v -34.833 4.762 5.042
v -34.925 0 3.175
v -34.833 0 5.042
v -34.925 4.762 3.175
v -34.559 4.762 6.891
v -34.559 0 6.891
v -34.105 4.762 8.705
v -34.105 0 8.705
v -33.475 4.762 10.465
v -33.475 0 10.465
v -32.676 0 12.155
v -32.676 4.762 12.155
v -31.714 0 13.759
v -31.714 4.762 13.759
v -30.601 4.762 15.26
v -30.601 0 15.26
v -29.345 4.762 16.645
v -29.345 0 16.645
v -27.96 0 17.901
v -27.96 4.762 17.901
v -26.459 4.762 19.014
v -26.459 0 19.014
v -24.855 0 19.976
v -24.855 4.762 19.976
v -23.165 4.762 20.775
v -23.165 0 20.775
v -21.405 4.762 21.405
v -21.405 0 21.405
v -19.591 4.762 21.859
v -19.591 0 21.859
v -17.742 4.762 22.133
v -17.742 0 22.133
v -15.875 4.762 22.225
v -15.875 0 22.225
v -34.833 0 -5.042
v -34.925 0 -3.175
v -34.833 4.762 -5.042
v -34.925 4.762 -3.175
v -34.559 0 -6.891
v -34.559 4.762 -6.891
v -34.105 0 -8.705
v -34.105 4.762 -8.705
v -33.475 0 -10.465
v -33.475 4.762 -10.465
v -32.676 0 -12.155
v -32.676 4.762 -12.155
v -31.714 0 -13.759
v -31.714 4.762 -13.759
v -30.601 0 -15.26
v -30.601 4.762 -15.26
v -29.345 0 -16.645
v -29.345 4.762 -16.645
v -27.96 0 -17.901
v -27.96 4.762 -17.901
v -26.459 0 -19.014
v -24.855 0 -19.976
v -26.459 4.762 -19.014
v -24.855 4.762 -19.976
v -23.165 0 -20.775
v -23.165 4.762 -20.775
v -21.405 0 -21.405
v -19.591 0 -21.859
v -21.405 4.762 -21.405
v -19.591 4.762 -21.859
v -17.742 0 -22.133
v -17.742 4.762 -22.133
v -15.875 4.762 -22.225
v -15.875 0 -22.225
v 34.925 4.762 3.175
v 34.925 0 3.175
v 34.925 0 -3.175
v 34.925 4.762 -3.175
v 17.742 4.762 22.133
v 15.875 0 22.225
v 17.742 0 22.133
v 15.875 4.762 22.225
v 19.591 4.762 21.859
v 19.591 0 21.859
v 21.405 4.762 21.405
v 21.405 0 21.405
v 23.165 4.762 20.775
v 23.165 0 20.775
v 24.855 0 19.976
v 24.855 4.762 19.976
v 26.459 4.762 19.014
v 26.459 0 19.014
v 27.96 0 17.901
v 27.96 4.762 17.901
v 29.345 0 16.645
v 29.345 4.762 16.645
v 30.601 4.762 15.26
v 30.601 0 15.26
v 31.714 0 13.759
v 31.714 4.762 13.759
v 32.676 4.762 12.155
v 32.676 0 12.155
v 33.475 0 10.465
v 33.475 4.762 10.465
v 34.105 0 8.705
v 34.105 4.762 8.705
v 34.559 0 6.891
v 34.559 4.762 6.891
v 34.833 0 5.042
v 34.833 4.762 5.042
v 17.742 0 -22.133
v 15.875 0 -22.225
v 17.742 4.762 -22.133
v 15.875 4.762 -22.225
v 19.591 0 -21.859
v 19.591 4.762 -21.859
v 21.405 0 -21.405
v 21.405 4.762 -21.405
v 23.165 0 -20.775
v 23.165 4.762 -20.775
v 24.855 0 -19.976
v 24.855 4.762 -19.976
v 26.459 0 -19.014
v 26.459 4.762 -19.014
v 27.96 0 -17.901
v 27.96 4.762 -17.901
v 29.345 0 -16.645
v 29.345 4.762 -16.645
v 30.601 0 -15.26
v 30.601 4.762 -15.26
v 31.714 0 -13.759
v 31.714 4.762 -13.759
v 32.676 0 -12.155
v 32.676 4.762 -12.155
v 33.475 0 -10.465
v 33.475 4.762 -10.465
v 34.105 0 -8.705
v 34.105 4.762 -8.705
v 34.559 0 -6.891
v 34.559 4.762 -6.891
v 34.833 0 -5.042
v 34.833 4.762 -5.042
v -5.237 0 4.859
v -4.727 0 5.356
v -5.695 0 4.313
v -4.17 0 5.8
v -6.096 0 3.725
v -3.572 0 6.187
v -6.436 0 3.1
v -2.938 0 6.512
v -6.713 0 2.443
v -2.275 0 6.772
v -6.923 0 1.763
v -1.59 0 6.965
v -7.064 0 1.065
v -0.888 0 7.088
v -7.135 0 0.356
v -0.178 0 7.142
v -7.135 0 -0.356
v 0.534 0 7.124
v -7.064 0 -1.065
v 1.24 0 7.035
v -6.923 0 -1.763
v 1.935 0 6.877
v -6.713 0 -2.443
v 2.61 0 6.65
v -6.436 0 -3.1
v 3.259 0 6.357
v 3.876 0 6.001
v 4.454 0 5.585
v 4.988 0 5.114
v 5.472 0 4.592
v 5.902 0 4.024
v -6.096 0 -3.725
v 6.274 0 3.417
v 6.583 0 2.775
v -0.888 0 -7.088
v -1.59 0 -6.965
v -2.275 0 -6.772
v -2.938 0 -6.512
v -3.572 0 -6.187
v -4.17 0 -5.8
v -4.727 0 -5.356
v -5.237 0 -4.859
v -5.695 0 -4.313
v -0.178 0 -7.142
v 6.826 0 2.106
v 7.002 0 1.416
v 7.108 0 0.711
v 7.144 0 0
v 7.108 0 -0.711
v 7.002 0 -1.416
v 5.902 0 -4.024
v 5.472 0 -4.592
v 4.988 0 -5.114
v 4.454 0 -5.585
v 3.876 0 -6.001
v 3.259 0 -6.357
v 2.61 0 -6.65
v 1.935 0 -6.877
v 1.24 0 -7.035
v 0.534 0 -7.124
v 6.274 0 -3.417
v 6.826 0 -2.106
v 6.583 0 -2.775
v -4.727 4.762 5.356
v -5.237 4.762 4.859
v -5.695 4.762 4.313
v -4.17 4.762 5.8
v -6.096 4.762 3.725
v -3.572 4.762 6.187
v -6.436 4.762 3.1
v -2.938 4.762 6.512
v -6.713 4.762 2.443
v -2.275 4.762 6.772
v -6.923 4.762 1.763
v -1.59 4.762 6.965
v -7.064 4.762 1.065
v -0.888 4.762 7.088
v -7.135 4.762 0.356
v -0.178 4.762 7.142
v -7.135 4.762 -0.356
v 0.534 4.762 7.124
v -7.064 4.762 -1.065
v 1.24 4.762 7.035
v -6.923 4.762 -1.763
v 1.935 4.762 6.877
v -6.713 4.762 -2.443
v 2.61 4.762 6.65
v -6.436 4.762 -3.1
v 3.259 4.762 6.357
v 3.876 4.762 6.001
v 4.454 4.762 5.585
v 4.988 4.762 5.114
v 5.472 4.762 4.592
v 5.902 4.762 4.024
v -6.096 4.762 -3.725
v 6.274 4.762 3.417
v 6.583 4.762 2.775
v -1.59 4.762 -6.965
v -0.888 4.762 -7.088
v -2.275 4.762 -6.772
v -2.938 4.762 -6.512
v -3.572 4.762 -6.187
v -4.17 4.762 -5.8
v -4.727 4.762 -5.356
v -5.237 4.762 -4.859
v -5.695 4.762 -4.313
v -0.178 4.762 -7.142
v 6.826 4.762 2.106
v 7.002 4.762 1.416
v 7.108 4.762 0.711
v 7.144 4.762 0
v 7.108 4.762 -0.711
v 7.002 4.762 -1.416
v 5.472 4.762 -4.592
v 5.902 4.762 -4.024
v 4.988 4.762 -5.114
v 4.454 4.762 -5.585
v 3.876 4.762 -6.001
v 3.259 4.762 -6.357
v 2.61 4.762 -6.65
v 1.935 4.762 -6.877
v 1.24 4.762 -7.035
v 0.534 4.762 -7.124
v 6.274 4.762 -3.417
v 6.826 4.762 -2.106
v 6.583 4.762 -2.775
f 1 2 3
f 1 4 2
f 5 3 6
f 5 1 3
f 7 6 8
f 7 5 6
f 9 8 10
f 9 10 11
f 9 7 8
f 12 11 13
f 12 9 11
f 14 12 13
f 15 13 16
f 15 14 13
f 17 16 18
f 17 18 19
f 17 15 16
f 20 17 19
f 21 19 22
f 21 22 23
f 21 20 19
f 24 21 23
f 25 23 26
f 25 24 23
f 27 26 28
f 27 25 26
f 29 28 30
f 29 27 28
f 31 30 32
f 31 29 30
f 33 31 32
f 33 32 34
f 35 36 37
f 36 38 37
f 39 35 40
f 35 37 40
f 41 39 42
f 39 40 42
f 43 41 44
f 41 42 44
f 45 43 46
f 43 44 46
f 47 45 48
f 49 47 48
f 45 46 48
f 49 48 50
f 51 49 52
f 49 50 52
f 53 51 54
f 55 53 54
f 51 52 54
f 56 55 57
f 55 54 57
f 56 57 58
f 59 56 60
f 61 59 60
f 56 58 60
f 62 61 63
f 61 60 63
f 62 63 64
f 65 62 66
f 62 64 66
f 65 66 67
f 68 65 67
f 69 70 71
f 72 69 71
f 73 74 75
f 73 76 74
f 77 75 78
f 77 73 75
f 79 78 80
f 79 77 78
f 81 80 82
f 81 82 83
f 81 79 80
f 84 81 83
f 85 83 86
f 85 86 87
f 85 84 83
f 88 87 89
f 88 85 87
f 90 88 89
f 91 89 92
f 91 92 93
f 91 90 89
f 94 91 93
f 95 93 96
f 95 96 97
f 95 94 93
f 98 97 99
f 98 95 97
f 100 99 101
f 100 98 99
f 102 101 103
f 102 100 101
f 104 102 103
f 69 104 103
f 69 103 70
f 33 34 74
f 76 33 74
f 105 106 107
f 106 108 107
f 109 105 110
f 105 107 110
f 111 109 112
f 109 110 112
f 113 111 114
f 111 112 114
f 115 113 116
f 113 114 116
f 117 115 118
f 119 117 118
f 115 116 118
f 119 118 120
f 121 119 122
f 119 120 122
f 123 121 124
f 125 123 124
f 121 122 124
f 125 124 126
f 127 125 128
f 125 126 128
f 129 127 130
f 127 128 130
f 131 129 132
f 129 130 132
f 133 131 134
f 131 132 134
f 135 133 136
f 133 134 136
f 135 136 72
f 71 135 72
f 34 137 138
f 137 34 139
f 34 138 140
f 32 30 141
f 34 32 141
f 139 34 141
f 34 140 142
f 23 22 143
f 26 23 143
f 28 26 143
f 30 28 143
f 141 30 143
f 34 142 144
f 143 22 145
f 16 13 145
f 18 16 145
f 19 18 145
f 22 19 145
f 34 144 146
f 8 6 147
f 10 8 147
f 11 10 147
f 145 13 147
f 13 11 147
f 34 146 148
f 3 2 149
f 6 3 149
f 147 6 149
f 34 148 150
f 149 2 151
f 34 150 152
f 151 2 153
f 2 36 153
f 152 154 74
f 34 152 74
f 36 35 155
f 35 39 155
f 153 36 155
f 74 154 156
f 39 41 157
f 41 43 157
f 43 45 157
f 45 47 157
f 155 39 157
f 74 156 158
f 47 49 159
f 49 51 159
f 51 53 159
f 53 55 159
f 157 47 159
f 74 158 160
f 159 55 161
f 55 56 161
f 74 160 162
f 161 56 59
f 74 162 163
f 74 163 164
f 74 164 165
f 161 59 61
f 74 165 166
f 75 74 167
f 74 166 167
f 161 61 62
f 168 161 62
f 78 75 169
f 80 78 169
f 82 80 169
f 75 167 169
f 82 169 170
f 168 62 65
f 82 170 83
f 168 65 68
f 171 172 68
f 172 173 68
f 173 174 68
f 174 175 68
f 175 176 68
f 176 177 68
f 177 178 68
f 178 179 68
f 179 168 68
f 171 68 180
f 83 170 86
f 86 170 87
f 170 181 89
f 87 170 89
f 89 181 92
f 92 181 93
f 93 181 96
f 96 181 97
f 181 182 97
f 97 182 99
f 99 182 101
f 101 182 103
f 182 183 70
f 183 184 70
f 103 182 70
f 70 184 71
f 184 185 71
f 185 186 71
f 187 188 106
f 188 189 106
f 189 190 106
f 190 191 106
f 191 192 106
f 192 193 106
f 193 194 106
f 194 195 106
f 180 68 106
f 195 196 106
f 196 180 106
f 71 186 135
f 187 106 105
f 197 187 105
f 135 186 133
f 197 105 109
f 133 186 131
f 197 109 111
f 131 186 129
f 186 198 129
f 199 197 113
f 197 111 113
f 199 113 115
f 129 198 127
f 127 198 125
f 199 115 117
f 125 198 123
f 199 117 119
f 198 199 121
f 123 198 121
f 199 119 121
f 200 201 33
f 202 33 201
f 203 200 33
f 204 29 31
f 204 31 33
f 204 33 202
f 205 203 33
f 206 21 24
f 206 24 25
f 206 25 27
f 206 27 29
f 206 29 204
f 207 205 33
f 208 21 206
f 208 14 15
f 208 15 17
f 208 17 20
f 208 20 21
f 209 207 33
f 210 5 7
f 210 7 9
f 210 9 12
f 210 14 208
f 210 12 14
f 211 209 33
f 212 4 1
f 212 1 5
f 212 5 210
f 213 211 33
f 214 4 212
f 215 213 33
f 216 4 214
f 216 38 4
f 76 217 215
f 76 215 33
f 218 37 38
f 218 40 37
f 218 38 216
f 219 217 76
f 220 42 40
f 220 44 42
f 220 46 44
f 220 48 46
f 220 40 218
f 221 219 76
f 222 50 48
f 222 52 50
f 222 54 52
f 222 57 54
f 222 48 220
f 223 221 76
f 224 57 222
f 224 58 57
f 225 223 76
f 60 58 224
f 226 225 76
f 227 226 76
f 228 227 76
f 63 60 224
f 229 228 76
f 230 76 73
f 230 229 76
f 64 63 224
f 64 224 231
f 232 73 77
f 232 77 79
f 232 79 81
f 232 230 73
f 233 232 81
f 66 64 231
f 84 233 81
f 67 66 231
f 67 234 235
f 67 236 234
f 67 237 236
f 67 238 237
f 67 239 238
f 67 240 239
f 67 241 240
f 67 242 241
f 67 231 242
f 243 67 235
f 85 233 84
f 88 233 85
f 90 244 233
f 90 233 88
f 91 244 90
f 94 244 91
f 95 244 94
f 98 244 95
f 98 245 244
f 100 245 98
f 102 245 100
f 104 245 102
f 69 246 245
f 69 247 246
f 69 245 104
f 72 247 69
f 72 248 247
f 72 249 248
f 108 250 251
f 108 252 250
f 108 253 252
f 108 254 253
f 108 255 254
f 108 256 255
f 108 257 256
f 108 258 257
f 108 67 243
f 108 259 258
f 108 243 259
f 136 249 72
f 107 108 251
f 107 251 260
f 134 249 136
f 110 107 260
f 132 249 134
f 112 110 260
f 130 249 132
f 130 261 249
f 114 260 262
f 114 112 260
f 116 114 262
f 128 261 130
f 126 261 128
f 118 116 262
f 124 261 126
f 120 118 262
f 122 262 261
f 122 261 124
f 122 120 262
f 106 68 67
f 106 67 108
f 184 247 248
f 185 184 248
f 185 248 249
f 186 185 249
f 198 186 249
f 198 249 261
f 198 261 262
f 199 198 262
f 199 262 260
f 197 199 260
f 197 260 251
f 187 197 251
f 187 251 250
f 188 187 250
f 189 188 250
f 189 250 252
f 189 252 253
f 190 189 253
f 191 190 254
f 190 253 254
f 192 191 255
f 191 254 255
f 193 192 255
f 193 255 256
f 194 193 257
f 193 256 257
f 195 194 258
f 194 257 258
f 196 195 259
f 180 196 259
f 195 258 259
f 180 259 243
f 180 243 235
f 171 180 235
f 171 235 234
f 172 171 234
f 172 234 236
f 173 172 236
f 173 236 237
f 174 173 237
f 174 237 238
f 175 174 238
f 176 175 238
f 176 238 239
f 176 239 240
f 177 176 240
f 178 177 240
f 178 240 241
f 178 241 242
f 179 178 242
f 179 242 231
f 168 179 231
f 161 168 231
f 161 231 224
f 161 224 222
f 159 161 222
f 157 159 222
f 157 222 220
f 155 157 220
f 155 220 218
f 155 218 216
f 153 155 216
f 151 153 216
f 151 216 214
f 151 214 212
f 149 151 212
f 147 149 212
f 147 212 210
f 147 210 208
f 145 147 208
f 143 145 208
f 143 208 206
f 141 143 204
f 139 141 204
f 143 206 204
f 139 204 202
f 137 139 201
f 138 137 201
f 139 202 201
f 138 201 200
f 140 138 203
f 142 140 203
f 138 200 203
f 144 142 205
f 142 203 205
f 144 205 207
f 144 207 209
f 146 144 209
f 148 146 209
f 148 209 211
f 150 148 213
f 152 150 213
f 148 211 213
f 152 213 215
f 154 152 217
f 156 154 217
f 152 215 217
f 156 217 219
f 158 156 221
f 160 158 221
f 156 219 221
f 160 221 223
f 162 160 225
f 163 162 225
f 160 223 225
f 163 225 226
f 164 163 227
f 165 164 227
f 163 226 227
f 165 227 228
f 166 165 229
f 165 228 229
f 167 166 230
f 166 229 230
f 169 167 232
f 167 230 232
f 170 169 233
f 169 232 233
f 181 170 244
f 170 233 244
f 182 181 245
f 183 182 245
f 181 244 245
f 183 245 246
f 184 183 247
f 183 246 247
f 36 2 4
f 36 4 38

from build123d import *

# Parameters (mm, degrees)
SKETCH1_W           = 69.85
SKETCH1_H           = 44.45
BOSS_EXTRUDE1_DEPTH = 4.7625
SKETCH2_R           = 7.14375
CUT_EXTRUDE1_DEPTH  = 5.7625
FILLET1_R           = 19.05
FILLET2_R           = 19.05


with BuildPart() as part:
    # Sketch1 → Boss-Extrude1 (new body)
    with BuildSketch(Plane(origin=(0, 0, 0), x_dir=(1, 0, 0), z_dir=(0, 1, 0))):
        Rectangle(SKETCH1_W, SKETCH1_H)
    extrude(amount=BOSS_EXTRUDE1_DEPTH)

    # Sketch2 → Cut-Extrude1 (cut, through all)
    with BuildSketch(Plane(origin=(0, 4.7625, 0), x_dir=(1, 0, 0), z_dir=(0, 1, 0))):
        Circle(SKETCH2_R)
    extrude(amount=-CUT_EXTRUDE1_DEPTH, mode=Mode.SUBTRACT)

    # Fillet1
    fillet1_edges = [part.edges().sort_by_distance(p)[0] for p in [
        (-34.925, 2.38125, 22.225),
        (-34.925, 2.38125, -22.225),
    ]]
    fillet(fillet1_edges, radius=FILLET1_R)

    # Fillet2
    fillet2_edges = [part.edges().sort_by_distance(p)[0] for p in [
        (34.925, 2.38125, 22.225),
        (34.925, 2.38125, -22.225),
    ]]
    fillet(fillet2_edges, radius=FILLET2_R)


solid = part.part
